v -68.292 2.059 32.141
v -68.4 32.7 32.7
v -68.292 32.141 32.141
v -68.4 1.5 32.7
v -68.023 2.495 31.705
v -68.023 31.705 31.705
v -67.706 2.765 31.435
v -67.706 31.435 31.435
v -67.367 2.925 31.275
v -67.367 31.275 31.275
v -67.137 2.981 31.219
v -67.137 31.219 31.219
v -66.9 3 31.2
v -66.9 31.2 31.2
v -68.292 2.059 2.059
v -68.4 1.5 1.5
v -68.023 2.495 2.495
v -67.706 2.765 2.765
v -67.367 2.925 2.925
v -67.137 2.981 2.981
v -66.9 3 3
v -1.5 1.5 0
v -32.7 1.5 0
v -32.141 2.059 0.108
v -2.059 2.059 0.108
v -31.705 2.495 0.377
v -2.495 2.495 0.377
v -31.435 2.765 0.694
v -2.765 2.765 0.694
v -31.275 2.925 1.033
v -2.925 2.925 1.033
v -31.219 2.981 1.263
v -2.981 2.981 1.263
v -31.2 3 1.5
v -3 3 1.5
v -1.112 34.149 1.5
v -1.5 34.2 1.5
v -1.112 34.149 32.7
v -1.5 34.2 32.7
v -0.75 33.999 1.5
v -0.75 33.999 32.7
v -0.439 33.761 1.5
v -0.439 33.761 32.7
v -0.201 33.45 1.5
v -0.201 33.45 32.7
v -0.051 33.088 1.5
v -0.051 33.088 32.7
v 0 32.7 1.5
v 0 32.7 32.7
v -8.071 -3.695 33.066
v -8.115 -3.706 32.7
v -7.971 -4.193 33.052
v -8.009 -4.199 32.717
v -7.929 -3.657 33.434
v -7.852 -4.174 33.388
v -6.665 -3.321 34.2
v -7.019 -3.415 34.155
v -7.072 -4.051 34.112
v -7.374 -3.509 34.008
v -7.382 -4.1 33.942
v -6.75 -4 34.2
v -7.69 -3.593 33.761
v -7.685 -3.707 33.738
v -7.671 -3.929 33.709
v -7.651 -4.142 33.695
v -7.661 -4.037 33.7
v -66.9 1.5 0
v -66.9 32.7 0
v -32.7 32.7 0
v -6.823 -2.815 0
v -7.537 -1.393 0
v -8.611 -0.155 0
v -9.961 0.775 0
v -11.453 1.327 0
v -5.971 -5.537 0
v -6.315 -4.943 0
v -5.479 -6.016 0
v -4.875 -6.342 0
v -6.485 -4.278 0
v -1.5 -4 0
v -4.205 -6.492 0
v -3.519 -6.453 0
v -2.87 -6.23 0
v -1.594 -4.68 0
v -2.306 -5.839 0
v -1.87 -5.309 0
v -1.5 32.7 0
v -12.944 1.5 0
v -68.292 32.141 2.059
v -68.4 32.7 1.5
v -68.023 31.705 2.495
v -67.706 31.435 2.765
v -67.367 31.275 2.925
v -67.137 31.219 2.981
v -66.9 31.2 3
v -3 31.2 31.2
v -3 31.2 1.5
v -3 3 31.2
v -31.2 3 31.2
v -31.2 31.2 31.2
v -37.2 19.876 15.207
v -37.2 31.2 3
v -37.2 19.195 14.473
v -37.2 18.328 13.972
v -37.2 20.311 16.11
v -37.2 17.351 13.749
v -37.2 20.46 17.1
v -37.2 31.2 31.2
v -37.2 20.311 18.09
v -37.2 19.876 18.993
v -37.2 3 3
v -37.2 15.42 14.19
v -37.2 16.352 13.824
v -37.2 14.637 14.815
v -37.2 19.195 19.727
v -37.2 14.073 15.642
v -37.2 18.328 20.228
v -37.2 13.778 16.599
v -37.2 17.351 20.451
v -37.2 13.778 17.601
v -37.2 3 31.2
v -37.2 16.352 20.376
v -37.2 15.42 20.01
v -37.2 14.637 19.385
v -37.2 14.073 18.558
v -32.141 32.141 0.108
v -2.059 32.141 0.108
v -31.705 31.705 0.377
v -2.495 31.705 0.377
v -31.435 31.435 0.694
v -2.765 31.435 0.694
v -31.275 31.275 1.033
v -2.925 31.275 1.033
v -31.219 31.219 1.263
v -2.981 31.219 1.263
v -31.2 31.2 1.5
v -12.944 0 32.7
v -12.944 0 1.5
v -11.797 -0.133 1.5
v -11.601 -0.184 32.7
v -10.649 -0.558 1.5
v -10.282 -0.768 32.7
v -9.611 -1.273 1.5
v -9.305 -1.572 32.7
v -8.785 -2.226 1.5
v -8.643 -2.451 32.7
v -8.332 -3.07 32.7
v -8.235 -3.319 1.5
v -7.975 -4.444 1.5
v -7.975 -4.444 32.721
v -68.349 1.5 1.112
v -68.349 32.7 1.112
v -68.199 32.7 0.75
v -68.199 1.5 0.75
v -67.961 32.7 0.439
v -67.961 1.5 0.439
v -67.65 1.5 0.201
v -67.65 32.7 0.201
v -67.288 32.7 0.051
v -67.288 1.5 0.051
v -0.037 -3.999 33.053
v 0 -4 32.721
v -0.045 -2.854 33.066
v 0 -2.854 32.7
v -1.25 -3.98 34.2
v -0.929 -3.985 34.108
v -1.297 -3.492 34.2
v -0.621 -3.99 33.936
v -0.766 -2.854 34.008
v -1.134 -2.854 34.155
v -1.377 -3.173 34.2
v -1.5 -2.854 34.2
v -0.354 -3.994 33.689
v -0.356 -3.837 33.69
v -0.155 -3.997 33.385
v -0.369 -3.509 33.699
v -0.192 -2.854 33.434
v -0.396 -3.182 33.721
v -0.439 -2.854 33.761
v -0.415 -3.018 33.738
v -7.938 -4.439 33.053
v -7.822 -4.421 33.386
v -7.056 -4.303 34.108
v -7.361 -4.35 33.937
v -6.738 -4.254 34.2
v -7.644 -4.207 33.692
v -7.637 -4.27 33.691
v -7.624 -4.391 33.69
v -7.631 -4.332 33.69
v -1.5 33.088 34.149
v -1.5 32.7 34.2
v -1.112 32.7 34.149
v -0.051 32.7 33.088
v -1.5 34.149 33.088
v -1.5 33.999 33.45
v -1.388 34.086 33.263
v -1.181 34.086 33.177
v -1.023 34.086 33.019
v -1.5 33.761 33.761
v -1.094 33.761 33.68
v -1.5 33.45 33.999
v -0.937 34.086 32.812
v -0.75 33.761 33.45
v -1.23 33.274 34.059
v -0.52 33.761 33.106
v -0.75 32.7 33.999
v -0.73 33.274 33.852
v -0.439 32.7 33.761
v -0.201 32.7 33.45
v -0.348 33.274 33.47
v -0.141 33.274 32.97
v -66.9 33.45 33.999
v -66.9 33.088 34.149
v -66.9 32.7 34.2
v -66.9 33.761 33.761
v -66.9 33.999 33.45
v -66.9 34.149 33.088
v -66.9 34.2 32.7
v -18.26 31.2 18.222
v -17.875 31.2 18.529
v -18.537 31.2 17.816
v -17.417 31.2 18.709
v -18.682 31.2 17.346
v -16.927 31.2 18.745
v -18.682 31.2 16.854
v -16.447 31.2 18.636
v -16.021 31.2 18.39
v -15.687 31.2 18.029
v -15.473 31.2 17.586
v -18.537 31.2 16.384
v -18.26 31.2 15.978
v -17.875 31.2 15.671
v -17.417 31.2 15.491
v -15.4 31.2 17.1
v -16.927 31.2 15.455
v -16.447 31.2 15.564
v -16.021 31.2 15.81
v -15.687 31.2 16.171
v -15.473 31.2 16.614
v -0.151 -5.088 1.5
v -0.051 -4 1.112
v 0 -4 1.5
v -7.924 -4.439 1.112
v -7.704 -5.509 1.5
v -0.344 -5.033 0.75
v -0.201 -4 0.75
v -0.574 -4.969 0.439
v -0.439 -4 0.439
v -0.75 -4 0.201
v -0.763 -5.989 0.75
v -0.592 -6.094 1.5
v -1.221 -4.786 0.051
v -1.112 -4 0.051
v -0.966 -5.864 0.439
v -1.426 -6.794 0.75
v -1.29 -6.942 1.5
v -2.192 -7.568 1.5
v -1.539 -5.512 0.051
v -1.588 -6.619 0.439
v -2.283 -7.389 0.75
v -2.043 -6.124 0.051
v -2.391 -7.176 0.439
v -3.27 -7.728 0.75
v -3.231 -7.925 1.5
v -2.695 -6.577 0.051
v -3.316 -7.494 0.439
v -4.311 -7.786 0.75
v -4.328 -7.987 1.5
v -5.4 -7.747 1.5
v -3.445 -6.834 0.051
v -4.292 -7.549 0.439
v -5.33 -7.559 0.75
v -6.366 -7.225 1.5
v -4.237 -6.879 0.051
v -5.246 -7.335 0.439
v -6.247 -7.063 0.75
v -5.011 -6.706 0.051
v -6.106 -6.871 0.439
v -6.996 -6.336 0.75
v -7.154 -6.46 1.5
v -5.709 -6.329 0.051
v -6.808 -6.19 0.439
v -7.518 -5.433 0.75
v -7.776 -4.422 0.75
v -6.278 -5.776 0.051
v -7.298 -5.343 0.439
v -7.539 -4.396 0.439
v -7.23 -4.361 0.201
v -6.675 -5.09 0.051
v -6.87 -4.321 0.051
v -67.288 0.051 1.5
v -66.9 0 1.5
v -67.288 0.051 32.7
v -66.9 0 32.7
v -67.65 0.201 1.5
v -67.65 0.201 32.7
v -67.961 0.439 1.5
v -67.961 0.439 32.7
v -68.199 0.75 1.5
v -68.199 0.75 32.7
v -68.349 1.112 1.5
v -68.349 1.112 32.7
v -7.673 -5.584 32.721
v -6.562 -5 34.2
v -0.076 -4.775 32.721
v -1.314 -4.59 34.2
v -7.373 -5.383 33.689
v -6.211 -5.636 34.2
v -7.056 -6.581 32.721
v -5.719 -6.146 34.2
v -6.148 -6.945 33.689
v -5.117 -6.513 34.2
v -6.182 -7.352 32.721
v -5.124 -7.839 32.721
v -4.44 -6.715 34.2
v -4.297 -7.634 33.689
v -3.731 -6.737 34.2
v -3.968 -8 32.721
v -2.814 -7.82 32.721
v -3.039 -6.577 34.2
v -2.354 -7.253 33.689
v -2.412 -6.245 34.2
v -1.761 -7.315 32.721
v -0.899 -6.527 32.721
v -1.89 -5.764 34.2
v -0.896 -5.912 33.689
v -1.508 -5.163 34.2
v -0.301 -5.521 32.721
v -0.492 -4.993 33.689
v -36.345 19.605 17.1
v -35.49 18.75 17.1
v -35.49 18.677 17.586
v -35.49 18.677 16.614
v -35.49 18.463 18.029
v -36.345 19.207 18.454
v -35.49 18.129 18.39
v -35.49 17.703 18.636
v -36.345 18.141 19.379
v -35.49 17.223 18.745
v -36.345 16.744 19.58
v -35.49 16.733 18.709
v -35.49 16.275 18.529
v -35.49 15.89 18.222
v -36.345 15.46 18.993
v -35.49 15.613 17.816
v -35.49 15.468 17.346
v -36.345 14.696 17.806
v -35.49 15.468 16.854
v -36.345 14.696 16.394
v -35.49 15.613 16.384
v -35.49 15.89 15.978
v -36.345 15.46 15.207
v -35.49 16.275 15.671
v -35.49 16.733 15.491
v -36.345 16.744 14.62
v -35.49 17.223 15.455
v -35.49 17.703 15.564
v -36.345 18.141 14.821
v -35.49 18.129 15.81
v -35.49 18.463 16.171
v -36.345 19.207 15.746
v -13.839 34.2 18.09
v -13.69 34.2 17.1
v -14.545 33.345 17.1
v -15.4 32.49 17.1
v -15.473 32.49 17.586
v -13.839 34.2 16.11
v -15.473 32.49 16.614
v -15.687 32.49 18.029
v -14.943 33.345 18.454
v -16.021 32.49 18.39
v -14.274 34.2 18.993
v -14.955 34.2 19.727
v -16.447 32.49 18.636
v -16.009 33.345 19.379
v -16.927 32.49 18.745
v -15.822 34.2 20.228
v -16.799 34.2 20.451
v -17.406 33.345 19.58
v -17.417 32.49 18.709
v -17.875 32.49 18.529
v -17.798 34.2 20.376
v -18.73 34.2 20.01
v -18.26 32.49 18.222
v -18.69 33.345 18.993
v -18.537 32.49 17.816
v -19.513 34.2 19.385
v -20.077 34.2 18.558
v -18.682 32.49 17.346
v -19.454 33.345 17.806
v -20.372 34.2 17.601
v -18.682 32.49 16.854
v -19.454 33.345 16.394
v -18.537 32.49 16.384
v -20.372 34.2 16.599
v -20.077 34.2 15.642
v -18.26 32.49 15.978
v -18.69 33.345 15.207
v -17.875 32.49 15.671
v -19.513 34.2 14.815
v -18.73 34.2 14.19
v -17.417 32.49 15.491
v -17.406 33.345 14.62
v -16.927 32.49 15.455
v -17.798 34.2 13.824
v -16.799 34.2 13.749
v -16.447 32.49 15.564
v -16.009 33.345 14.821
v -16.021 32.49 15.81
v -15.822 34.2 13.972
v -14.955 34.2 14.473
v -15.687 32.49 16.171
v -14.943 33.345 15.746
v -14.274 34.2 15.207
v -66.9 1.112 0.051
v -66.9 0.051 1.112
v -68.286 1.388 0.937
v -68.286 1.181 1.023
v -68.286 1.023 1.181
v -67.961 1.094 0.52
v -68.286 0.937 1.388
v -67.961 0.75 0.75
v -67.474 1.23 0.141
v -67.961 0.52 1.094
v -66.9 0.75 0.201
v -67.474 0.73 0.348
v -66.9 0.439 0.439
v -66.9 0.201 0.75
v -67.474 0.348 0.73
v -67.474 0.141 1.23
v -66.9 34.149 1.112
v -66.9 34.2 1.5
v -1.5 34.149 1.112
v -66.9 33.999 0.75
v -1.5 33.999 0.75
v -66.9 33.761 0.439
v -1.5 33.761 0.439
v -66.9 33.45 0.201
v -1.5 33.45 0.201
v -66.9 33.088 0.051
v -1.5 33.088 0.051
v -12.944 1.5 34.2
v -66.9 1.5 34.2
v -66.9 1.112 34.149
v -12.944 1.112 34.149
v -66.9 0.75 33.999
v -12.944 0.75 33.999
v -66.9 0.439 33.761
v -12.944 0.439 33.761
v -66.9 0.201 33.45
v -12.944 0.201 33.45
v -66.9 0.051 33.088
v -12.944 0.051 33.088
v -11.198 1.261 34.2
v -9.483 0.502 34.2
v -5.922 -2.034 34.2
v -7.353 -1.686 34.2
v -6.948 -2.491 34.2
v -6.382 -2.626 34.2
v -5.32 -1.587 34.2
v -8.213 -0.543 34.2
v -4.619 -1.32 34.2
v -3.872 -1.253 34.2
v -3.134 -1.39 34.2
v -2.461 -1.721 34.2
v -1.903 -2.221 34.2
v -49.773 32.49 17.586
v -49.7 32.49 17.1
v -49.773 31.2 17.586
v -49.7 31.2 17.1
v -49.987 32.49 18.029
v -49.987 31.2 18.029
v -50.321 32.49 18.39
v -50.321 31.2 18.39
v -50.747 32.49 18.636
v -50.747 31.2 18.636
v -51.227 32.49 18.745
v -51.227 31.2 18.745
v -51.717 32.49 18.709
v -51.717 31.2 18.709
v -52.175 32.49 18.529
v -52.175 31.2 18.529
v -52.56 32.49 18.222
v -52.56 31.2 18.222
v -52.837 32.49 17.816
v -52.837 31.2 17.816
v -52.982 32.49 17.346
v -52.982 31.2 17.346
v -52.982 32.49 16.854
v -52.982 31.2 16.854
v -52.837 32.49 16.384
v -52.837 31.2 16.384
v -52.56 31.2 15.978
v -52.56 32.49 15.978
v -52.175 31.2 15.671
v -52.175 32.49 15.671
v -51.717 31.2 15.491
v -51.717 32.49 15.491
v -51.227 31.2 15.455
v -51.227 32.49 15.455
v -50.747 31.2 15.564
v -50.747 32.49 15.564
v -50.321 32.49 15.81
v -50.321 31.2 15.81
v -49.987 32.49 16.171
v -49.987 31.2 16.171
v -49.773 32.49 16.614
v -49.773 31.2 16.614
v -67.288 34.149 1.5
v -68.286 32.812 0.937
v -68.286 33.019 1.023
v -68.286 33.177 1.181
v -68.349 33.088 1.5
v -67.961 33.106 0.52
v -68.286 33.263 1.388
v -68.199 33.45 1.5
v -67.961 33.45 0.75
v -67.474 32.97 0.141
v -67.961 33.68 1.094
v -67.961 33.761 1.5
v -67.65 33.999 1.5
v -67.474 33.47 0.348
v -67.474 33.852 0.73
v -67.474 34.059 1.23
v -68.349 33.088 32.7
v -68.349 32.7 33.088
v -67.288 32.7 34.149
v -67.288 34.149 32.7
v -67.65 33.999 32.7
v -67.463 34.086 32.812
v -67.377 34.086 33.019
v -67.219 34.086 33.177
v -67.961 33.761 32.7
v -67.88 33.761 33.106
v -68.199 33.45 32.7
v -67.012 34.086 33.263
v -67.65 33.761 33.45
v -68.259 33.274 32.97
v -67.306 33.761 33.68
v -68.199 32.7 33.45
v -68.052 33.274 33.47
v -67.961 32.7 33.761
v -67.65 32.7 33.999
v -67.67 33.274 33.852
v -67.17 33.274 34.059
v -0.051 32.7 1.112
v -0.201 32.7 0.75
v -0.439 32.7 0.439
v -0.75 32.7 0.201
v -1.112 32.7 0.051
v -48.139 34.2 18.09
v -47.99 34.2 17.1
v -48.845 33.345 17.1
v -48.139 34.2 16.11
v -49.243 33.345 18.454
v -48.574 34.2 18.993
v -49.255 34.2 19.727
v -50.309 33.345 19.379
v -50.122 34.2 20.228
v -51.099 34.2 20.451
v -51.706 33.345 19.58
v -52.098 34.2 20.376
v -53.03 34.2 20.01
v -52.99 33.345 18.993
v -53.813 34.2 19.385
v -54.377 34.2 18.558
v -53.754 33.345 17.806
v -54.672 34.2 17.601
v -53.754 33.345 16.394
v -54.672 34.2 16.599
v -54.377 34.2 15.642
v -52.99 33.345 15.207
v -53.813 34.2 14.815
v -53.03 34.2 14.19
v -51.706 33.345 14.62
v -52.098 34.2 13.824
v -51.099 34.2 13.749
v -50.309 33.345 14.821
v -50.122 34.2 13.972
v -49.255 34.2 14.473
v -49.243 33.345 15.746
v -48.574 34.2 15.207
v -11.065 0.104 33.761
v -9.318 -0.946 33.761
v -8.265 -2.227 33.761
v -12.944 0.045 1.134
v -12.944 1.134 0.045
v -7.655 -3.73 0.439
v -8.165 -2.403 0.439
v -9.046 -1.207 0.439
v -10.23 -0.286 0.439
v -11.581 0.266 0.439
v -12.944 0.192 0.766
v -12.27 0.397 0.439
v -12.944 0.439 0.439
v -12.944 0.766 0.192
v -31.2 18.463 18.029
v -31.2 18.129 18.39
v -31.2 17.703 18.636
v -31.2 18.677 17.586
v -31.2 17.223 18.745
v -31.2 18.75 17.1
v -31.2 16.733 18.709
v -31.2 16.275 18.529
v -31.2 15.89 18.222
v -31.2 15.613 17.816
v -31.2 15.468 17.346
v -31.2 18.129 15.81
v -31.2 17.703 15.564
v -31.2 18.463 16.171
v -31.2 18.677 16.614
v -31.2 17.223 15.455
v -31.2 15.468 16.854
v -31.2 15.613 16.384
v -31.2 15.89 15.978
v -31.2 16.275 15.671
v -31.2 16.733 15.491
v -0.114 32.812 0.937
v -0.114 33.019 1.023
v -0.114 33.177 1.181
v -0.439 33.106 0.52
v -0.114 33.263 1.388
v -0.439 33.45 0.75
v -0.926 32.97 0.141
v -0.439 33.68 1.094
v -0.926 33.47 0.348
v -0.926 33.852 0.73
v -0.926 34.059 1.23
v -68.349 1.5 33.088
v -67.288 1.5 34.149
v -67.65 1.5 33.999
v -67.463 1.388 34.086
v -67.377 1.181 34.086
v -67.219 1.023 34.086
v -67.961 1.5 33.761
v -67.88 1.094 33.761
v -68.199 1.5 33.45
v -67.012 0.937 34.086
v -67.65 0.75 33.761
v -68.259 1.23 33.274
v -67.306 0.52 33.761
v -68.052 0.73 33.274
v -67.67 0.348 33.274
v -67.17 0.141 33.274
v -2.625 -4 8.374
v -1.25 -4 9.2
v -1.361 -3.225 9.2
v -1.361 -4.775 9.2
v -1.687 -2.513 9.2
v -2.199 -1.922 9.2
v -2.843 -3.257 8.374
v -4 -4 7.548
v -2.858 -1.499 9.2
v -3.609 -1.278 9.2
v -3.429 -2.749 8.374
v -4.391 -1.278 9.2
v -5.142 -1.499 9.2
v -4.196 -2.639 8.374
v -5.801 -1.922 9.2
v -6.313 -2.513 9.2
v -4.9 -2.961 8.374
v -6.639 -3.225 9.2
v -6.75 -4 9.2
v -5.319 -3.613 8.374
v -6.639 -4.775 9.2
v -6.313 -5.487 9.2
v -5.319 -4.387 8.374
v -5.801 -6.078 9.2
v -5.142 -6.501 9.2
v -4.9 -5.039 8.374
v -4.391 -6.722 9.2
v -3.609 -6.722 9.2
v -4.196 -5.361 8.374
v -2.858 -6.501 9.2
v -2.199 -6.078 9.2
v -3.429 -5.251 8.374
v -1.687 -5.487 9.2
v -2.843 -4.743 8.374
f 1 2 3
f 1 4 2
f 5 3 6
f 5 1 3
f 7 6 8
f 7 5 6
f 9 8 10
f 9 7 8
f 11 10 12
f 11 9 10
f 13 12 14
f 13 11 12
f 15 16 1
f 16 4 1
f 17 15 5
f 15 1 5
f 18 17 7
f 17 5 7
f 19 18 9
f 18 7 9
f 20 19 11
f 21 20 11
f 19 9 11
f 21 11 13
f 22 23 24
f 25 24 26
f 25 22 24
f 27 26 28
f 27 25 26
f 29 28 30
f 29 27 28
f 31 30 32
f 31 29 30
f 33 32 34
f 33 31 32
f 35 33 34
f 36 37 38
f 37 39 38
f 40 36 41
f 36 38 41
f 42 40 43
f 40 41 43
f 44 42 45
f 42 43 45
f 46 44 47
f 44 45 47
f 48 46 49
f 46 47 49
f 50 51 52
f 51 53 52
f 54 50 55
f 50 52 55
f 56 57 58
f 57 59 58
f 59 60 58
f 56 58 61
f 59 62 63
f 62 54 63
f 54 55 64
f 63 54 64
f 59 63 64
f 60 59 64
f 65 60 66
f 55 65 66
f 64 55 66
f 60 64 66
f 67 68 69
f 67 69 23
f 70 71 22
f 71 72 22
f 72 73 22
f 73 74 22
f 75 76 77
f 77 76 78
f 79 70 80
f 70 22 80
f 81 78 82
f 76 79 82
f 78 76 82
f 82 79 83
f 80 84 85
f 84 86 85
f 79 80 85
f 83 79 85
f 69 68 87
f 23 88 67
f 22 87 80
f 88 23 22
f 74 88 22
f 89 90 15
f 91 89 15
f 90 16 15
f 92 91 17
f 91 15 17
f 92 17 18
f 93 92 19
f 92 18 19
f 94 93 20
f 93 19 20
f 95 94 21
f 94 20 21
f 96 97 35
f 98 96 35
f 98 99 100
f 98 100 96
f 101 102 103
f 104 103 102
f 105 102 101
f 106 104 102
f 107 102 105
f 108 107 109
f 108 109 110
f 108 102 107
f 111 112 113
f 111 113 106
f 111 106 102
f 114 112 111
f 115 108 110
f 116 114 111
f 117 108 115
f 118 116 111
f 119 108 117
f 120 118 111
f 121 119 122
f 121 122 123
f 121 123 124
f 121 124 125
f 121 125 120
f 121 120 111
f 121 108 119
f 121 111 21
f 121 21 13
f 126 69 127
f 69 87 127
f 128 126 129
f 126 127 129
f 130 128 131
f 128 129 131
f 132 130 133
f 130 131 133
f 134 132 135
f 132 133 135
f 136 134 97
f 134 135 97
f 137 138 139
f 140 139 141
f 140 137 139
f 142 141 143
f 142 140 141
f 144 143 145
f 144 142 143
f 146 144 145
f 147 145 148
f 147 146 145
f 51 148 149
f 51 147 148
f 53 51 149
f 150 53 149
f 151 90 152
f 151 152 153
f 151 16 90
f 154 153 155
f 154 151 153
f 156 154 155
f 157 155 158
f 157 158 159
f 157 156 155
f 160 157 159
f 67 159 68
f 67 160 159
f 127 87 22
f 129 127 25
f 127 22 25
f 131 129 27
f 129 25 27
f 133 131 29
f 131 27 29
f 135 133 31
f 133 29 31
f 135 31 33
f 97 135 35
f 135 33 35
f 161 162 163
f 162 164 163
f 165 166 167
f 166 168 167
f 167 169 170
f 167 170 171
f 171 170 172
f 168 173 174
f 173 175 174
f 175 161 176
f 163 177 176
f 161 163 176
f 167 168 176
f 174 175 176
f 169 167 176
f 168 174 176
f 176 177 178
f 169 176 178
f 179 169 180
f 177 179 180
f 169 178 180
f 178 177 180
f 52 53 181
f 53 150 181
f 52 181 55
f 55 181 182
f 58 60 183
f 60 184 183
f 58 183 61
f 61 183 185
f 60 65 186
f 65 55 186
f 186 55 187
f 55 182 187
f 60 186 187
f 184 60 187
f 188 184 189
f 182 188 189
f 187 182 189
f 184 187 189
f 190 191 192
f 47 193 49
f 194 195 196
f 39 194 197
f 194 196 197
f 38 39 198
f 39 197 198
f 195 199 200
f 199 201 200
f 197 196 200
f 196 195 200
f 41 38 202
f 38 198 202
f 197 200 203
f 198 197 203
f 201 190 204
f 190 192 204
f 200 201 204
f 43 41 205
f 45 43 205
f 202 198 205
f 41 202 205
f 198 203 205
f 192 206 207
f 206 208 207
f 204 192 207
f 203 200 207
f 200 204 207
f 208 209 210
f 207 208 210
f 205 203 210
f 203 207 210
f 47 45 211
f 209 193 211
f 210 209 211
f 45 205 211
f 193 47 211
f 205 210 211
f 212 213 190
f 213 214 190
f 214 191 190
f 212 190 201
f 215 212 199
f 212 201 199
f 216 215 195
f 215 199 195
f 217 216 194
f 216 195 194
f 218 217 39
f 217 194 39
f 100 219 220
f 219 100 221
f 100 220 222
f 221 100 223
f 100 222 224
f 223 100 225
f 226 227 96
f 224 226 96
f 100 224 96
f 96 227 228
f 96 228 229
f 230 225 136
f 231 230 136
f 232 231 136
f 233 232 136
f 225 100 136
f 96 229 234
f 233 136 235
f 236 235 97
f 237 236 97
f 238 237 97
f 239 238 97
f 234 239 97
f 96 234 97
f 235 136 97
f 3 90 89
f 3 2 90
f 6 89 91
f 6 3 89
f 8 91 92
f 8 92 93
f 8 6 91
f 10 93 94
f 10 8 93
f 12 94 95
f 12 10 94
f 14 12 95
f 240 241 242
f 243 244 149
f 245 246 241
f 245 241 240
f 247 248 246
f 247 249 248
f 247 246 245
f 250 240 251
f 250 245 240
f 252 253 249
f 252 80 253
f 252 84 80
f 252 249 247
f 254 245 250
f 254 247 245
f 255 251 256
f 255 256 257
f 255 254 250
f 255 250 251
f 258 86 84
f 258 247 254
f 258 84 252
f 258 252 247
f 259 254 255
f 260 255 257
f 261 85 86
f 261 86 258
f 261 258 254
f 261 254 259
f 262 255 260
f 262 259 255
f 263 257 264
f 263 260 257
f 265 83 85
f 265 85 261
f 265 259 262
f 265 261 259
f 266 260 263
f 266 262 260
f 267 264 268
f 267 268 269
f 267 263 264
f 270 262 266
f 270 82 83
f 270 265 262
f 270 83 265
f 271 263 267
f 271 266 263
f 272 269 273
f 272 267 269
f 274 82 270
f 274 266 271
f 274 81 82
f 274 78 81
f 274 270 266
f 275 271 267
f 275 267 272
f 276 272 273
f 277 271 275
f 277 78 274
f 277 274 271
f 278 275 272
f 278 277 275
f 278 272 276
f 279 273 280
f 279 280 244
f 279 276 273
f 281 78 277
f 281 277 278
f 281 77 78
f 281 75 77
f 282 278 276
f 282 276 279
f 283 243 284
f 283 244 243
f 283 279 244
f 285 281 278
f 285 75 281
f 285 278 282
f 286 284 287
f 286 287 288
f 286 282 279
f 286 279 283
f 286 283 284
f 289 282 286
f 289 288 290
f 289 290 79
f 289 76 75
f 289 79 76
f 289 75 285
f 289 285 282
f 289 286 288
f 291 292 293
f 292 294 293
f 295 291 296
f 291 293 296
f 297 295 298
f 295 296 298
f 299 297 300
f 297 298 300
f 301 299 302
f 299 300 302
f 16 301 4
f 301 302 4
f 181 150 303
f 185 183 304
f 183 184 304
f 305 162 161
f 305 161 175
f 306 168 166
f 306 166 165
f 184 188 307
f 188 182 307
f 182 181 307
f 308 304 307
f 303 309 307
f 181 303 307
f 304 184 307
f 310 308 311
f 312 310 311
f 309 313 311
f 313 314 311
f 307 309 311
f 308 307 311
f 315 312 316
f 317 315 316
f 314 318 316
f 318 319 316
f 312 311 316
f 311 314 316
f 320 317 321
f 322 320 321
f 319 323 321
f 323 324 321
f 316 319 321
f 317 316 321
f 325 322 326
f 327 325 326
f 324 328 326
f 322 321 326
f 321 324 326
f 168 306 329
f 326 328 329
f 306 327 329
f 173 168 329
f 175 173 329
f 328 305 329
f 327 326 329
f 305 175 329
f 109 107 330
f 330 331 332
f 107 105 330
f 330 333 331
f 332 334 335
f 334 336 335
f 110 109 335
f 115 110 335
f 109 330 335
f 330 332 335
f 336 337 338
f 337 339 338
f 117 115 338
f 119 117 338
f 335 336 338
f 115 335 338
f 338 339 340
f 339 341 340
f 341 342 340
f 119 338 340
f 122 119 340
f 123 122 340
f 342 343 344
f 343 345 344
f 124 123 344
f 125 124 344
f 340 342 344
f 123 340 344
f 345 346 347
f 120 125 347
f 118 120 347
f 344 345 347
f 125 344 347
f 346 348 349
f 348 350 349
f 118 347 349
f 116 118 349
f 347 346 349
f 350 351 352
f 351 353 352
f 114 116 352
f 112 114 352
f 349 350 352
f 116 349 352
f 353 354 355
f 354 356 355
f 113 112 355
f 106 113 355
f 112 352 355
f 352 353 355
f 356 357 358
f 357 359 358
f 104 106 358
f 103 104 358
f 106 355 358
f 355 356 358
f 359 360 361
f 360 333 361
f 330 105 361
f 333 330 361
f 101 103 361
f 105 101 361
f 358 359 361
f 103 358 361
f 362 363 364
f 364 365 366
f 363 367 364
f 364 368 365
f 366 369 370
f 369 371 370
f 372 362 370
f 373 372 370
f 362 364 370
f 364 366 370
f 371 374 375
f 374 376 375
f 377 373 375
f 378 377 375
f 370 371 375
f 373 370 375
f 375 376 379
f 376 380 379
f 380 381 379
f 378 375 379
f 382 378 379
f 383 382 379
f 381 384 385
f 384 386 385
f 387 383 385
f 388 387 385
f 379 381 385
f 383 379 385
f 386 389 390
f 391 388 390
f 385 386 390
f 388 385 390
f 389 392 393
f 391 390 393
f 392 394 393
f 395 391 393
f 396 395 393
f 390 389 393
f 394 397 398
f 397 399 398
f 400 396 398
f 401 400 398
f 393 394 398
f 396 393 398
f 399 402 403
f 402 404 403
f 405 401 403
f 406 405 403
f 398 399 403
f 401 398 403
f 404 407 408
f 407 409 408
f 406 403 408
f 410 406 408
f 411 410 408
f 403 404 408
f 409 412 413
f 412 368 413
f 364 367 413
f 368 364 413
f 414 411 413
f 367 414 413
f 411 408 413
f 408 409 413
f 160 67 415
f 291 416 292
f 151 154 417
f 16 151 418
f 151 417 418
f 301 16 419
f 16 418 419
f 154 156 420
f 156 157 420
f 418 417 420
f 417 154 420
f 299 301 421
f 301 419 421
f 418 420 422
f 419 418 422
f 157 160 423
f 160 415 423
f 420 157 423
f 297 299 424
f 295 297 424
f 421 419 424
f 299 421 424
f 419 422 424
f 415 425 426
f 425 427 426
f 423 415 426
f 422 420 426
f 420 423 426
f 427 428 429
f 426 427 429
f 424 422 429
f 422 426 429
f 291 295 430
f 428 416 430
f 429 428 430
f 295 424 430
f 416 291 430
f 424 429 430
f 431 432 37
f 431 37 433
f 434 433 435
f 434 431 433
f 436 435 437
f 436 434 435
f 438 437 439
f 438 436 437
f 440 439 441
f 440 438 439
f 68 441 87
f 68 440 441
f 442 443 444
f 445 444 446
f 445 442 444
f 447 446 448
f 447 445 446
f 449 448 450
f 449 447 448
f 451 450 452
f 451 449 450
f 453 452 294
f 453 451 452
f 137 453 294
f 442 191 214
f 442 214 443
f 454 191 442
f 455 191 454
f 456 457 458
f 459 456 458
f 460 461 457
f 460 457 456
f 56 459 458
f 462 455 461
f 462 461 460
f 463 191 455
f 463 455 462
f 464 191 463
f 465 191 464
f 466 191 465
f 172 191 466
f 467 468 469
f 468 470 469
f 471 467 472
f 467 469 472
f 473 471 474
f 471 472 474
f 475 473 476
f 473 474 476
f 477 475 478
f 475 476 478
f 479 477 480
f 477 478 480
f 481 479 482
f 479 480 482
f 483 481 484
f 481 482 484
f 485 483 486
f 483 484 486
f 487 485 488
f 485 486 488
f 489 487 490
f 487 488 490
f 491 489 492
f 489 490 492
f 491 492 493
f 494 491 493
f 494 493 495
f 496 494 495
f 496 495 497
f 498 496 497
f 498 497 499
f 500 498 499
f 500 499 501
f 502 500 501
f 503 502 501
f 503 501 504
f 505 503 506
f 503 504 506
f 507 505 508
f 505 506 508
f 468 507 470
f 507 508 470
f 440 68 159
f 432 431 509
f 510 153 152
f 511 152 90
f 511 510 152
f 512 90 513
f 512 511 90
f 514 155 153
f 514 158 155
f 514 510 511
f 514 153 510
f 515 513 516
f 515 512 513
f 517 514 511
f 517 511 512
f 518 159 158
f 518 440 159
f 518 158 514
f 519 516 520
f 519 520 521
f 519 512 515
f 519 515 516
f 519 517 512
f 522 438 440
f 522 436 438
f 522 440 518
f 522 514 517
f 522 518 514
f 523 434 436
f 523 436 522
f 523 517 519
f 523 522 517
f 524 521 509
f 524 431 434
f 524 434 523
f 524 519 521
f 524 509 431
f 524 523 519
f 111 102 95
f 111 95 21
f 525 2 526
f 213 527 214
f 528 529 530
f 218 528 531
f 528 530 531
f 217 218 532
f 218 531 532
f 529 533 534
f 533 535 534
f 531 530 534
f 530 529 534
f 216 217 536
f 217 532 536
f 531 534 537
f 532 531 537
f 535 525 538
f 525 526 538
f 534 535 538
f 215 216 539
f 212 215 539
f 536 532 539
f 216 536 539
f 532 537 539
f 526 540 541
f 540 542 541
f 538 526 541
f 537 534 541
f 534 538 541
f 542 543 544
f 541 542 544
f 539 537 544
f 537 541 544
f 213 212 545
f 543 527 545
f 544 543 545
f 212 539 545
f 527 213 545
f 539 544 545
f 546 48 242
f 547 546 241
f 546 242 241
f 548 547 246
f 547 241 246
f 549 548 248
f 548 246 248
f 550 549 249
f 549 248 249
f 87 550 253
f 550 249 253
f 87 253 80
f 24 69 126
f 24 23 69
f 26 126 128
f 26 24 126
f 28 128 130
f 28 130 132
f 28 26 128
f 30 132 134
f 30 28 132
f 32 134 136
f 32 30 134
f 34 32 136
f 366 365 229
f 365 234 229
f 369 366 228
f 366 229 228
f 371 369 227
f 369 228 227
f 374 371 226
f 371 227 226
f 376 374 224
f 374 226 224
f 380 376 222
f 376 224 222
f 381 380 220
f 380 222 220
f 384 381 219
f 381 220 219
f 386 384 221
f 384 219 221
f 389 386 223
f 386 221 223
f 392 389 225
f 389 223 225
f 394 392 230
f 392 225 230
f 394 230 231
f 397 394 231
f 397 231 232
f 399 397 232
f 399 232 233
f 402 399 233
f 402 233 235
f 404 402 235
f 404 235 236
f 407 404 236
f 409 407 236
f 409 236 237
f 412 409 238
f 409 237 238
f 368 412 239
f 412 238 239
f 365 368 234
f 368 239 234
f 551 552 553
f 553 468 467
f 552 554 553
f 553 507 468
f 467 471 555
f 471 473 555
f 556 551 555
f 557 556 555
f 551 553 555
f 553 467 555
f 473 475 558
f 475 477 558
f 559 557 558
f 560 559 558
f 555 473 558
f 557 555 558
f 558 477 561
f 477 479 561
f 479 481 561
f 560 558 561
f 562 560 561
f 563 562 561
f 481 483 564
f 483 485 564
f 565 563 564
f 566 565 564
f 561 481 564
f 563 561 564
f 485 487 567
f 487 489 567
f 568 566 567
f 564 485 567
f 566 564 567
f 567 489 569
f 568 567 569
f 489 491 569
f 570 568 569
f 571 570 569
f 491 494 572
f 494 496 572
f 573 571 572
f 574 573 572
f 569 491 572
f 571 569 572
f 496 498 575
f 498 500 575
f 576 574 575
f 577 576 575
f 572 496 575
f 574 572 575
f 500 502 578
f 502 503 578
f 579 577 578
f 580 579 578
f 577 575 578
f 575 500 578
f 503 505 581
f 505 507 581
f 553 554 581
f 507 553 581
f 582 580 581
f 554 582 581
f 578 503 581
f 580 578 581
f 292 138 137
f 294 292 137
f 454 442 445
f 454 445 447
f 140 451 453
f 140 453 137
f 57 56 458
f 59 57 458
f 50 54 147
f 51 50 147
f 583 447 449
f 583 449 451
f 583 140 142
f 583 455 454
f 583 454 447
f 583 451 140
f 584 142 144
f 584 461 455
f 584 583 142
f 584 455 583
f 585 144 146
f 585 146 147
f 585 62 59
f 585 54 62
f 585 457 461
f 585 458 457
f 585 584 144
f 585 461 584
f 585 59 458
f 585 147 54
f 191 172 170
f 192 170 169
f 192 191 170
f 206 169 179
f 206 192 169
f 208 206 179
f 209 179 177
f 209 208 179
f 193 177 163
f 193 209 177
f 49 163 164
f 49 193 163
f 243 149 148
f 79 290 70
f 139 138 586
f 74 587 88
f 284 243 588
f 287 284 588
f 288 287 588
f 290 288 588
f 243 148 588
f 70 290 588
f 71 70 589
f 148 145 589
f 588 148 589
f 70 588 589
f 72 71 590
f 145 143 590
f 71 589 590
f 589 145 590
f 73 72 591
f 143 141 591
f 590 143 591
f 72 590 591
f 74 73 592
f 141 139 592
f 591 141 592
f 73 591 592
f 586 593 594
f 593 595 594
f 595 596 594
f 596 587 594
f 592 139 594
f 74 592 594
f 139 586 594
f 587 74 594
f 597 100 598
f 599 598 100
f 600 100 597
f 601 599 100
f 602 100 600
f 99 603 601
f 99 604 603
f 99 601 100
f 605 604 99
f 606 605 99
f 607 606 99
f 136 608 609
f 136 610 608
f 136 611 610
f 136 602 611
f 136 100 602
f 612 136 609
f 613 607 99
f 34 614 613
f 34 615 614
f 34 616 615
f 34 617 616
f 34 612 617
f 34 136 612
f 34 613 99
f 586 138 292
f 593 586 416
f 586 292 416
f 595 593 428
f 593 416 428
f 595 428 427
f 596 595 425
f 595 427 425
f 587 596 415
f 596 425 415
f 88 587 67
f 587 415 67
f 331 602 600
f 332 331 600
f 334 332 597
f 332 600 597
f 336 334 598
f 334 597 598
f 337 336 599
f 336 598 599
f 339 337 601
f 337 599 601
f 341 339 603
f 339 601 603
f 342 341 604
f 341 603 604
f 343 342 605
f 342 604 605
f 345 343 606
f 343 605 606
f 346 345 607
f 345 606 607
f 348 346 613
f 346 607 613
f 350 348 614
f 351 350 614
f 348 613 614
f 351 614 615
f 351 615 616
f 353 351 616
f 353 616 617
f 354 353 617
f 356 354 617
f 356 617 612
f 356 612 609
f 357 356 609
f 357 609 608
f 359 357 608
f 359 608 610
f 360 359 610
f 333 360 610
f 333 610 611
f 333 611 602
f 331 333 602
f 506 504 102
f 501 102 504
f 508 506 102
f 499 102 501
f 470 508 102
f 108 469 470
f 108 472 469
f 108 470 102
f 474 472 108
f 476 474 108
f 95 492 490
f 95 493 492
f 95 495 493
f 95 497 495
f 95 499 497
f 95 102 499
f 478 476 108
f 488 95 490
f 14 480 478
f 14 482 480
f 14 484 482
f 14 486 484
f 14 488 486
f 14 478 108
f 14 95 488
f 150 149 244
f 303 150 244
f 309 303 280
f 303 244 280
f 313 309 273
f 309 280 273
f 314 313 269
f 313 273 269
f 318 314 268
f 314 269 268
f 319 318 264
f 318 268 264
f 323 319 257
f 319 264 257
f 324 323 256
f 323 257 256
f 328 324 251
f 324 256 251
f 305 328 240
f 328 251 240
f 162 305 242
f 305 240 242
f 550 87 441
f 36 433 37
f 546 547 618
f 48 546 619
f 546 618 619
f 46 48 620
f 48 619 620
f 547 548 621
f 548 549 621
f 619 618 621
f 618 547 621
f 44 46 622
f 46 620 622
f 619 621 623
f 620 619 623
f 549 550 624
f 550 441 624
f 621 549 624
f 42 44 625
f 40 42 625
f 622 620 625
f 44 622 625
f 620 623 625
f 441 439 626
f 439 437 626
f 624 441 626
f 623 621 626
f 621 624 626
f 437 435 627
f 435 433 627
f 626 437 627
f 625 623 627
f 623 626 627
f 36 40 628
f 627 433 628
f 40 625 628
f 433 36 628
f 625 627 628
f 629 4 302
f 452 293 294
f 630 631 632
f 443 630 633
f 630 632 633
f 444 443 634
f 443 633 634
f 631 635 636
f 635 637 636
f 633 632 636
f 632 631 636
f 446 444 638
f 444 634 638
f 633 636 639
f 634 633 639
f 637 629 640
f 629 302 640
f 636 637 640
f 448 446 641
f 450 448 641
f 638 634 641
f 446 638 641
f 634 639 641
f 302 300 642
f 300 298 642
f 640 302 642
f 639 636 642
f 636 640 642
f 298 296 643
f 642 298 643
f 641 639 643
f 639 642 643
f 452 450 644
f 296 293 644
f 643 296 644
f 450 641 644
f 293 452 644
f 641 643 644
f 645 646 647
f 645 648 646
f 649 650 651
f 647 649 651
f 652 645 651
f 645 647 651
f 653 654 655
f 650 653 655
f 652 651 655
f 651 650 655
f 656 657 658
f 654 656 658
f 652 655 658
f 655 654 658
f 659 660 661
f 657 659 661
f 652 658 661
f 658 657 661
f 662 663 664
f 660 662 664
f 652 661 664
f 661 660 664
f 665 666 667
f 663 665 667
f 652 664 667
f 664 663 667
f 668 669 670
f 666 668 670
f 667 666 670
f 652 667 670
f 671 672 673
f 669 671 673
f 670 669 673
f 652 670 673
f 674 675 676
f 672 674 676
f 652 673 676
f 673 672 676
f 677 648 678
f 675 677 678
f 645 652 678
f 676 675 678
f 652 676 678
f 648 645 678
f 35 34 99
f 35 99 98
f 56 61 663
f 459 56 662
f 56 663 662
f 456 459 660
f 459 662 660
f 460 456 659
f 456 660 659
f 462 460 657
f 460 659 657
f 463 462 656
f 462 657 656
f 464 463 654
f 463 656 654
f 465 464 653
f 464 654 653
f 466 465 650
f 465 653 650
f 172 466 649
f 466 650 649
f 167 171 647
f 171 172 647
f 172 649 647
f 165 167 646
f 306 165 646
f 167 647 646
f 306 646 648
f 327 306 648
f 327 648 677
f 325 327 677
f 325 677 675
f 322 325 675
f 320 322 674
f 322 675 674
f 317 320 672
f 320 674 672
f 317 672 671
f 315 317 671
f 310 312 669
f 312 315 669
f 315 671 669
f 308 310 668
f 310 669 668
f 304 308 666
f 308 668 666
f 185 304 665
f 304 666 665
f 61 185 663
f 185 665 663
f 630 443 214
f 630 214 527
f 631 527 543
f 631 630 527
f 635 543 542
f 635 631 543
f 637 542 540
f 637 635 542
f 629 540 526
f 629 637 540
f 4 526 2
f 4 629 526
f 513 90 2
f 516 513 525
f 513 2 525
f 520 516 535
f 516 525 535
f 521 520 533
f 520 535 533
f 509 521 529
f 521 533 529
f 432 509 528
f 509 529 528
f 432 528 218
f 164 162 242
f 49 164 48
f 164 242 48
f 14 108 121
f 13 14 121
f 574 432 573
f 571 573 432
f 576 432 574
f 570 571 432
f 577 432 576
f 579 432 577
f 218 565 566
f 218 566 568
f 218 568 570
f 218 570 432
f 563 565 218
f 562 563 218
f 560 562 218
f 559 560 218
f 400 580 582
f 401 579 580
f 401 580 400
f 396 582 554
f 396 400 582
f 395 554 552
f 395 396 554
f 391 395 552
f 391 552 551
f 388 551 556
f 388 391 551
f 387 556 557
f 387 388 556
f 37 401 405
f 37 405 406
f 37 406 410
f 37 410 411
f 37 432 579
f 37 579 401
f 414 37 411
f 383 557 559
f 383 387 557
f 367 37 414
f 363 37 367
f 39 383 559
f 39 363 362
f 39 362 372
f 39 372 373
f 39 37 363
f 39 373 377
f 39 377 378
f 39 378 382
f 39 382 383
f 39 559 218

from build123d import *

# Parameters (mm, degrees)
F1_DEPTH             = 34.2
F2_W                 = 34.2
F2_H                 = 34.2
F3_DEPTH             = 34.2
F4_W                 = 28.2
F4_H                 = 28.2
F5_DEPTH             = 31.2
F8_D                 = 3.3
F8_DEPTH             = 25
F8_CSINK_D           = 6.72
F8_CSINK_ANGLE       = 90
F8_TIP               = 0.9914200214
F8_ON_F7_D           = 3.3
F8_ON_F7_DEPTH       = 25
F8_ON_F7_CSINK_D     = 6.72
F8_ON_F7_CSINK_ANGLE = 90
F8_ON_F7_TIP         = 0.9914200214
F10_D                = 5.5
F10_DEPTH            = 25
F10_TIP              = 1.6523667023
F11_R                = 5
F12_W                = 28.2
F12_H                = 28.2
F13_DEPTH            = 31.2
F14_R                = 1.49999


# Not quite as in the source:
# - a fillet or chamfer is up to 0.001 mm smaller than in the source, because OpenCascade refuses the exact size


with BuildPart() as f1:
    # F0 (on Top) → F1 (new body)
    with BuildSketch(Plane.XY):
        with BuildLine():
            Line((0, 0), (-8, 0))
            Line((-8, 0), (-8, -4))
            ThreePointArc((-8, -4), (-4, -8), (0, -4))
            Line((0, -4), (0, 0))
        make_face()
        Polygon((-34.2, 0), (-8, 0), (0, 0), (0, 34.2), (-34.2, 34.2), align=None)
    extrude(amount=F1_DEPTH)

    # F2 (on face) → F3 (join)
    with BuildSketch(Plane(origin=(-34.2, 0, 0), x_dir=(0, -1, 0), z_dir=(-1, 0, 0))):
        with Locations((-17.1, 17.1)):
            Rectangle(F2_W, F2_H)
    extrude(amount=F3_DEPTH)

    # F4 (on face) → F5 (cut)
    with BuildSketch(Plane(origin=(-68.4, 0, 0), x_dir=(0, -1, 0), z_dir=(-1, 0, 0))):
        with Locations((-17.1, 17.1)):
            Rectangle(F4_W, F4_H)
    extrude(amount=-F5_DEPTH, mode=Mode.SUBTRACT)

    # F8
    with Locations(Plane(origin=(0, 34.2, 0), x_dir=(-1, 0, 0), z_dir=(0, 1, 0))):
        with Locations((17.05, 17.1), (51.35, 17.1)):
            CounterSinkHole(F8_D / 2, F8_CSINK_D / 2, depth=F8_DEPTH, counter_sink_angle=F8_CSINK_ANGLE)
            with Locations((0, 0, -(F8_DEPTH + F8_TIP / 2))):  # 118° drill point
                Cone(0, F8_D / 2, F8_TIP, mode=Mode.SUBTRACT)

    # F8 on F7
    with Locations(Plane(origin=(-37.2, 0, 0), x_dir=(0, -1, 0), z_dir=(-1, 0, 0))):
        with Locations((-17.1, 17.1)):
            CounterSinkHole(F8_ON_F7_D / 2, F8_ON_F7_CSINK_D / 2, depth=F8_ON_F7_DEPTH, counter_sink_angle=F8_ON_F7_CSINK_ANGLE)
            with Locations((0, 0, -(F8_ON_F7_DEPTH + F8_ON_F7_TIP / 2))):  # 118° drill point
                Cone(0, F8_ON_F7_D / 2, F8_ON_F7_TIP, mode=Mode.SUBTRACT)

    # F10
    with Locations(Plane.XY.offset(34.2)):
        with Locations((-4, -4)):
            Hole(F10_D / 2, depth=F10_DEPTH)
            with Locations((0, 0, -(F10_DEPTH + F10_TIP / 2))):  # 118° drill point
                Cone(0, F10_D / 2, F10_TIP, mode=Mode.SUBTRACT)

    # F11
    f11_edges = [f1.edges().sort_by_distance(p)[0] for p in [
        (-8, 0, 17.1),
    ]]
    fillet(f11_edges, radius=F11_R)

    # F12 (on face) → F13 (cut)
    with BuildSketch(Plane(origin=(0, 0, 0), x_dir=(1, 0, 0), z_dir=(0, 0, -1))):
        with Locations((-17.1, -17.1)):
            Rectangle(F12_W, F12_H)
    extrude(amount=-F13_DEPTH, mode=Mode.SUBTRACT)

    # F14 (radius 1.5 in the source; OpenCascade refuses exactly that, so slightly less here)
    f14_edges = [f1.edges().sort_by_distance(p)[0] for p in [
        (-31.2, 17.1, 0),
        (-17.1, 3, 0),
        (-3, 17.1, 0),
        (-17.1, 31.2, 0),
        (-34.2, 34.2, 0),
        (-40.672136, 0, 0),
        (0, 15.1, 0),
        (-68.4, 17.1, 0),
        (-68.4, 0, 17.1),
        (-68.4, 17.1, 34.2),
        (-68.4, 34.2, 17.1),
        (-68.4, 17.1, 31.2),
        (-68.4, 3, 17.1),
        (-68.4, 17.1, 3),
        (-68.4, 31.2, 17.1),
        (-40.672136, 0, 34.2),
        (-34.2, 34.2, 34.2),
        (0, 15.1, 34.2),
        (0, 34.2, 17.1),
    ]]
    fillet(f14_edges, radius=F14_R)


solid = f1.part
